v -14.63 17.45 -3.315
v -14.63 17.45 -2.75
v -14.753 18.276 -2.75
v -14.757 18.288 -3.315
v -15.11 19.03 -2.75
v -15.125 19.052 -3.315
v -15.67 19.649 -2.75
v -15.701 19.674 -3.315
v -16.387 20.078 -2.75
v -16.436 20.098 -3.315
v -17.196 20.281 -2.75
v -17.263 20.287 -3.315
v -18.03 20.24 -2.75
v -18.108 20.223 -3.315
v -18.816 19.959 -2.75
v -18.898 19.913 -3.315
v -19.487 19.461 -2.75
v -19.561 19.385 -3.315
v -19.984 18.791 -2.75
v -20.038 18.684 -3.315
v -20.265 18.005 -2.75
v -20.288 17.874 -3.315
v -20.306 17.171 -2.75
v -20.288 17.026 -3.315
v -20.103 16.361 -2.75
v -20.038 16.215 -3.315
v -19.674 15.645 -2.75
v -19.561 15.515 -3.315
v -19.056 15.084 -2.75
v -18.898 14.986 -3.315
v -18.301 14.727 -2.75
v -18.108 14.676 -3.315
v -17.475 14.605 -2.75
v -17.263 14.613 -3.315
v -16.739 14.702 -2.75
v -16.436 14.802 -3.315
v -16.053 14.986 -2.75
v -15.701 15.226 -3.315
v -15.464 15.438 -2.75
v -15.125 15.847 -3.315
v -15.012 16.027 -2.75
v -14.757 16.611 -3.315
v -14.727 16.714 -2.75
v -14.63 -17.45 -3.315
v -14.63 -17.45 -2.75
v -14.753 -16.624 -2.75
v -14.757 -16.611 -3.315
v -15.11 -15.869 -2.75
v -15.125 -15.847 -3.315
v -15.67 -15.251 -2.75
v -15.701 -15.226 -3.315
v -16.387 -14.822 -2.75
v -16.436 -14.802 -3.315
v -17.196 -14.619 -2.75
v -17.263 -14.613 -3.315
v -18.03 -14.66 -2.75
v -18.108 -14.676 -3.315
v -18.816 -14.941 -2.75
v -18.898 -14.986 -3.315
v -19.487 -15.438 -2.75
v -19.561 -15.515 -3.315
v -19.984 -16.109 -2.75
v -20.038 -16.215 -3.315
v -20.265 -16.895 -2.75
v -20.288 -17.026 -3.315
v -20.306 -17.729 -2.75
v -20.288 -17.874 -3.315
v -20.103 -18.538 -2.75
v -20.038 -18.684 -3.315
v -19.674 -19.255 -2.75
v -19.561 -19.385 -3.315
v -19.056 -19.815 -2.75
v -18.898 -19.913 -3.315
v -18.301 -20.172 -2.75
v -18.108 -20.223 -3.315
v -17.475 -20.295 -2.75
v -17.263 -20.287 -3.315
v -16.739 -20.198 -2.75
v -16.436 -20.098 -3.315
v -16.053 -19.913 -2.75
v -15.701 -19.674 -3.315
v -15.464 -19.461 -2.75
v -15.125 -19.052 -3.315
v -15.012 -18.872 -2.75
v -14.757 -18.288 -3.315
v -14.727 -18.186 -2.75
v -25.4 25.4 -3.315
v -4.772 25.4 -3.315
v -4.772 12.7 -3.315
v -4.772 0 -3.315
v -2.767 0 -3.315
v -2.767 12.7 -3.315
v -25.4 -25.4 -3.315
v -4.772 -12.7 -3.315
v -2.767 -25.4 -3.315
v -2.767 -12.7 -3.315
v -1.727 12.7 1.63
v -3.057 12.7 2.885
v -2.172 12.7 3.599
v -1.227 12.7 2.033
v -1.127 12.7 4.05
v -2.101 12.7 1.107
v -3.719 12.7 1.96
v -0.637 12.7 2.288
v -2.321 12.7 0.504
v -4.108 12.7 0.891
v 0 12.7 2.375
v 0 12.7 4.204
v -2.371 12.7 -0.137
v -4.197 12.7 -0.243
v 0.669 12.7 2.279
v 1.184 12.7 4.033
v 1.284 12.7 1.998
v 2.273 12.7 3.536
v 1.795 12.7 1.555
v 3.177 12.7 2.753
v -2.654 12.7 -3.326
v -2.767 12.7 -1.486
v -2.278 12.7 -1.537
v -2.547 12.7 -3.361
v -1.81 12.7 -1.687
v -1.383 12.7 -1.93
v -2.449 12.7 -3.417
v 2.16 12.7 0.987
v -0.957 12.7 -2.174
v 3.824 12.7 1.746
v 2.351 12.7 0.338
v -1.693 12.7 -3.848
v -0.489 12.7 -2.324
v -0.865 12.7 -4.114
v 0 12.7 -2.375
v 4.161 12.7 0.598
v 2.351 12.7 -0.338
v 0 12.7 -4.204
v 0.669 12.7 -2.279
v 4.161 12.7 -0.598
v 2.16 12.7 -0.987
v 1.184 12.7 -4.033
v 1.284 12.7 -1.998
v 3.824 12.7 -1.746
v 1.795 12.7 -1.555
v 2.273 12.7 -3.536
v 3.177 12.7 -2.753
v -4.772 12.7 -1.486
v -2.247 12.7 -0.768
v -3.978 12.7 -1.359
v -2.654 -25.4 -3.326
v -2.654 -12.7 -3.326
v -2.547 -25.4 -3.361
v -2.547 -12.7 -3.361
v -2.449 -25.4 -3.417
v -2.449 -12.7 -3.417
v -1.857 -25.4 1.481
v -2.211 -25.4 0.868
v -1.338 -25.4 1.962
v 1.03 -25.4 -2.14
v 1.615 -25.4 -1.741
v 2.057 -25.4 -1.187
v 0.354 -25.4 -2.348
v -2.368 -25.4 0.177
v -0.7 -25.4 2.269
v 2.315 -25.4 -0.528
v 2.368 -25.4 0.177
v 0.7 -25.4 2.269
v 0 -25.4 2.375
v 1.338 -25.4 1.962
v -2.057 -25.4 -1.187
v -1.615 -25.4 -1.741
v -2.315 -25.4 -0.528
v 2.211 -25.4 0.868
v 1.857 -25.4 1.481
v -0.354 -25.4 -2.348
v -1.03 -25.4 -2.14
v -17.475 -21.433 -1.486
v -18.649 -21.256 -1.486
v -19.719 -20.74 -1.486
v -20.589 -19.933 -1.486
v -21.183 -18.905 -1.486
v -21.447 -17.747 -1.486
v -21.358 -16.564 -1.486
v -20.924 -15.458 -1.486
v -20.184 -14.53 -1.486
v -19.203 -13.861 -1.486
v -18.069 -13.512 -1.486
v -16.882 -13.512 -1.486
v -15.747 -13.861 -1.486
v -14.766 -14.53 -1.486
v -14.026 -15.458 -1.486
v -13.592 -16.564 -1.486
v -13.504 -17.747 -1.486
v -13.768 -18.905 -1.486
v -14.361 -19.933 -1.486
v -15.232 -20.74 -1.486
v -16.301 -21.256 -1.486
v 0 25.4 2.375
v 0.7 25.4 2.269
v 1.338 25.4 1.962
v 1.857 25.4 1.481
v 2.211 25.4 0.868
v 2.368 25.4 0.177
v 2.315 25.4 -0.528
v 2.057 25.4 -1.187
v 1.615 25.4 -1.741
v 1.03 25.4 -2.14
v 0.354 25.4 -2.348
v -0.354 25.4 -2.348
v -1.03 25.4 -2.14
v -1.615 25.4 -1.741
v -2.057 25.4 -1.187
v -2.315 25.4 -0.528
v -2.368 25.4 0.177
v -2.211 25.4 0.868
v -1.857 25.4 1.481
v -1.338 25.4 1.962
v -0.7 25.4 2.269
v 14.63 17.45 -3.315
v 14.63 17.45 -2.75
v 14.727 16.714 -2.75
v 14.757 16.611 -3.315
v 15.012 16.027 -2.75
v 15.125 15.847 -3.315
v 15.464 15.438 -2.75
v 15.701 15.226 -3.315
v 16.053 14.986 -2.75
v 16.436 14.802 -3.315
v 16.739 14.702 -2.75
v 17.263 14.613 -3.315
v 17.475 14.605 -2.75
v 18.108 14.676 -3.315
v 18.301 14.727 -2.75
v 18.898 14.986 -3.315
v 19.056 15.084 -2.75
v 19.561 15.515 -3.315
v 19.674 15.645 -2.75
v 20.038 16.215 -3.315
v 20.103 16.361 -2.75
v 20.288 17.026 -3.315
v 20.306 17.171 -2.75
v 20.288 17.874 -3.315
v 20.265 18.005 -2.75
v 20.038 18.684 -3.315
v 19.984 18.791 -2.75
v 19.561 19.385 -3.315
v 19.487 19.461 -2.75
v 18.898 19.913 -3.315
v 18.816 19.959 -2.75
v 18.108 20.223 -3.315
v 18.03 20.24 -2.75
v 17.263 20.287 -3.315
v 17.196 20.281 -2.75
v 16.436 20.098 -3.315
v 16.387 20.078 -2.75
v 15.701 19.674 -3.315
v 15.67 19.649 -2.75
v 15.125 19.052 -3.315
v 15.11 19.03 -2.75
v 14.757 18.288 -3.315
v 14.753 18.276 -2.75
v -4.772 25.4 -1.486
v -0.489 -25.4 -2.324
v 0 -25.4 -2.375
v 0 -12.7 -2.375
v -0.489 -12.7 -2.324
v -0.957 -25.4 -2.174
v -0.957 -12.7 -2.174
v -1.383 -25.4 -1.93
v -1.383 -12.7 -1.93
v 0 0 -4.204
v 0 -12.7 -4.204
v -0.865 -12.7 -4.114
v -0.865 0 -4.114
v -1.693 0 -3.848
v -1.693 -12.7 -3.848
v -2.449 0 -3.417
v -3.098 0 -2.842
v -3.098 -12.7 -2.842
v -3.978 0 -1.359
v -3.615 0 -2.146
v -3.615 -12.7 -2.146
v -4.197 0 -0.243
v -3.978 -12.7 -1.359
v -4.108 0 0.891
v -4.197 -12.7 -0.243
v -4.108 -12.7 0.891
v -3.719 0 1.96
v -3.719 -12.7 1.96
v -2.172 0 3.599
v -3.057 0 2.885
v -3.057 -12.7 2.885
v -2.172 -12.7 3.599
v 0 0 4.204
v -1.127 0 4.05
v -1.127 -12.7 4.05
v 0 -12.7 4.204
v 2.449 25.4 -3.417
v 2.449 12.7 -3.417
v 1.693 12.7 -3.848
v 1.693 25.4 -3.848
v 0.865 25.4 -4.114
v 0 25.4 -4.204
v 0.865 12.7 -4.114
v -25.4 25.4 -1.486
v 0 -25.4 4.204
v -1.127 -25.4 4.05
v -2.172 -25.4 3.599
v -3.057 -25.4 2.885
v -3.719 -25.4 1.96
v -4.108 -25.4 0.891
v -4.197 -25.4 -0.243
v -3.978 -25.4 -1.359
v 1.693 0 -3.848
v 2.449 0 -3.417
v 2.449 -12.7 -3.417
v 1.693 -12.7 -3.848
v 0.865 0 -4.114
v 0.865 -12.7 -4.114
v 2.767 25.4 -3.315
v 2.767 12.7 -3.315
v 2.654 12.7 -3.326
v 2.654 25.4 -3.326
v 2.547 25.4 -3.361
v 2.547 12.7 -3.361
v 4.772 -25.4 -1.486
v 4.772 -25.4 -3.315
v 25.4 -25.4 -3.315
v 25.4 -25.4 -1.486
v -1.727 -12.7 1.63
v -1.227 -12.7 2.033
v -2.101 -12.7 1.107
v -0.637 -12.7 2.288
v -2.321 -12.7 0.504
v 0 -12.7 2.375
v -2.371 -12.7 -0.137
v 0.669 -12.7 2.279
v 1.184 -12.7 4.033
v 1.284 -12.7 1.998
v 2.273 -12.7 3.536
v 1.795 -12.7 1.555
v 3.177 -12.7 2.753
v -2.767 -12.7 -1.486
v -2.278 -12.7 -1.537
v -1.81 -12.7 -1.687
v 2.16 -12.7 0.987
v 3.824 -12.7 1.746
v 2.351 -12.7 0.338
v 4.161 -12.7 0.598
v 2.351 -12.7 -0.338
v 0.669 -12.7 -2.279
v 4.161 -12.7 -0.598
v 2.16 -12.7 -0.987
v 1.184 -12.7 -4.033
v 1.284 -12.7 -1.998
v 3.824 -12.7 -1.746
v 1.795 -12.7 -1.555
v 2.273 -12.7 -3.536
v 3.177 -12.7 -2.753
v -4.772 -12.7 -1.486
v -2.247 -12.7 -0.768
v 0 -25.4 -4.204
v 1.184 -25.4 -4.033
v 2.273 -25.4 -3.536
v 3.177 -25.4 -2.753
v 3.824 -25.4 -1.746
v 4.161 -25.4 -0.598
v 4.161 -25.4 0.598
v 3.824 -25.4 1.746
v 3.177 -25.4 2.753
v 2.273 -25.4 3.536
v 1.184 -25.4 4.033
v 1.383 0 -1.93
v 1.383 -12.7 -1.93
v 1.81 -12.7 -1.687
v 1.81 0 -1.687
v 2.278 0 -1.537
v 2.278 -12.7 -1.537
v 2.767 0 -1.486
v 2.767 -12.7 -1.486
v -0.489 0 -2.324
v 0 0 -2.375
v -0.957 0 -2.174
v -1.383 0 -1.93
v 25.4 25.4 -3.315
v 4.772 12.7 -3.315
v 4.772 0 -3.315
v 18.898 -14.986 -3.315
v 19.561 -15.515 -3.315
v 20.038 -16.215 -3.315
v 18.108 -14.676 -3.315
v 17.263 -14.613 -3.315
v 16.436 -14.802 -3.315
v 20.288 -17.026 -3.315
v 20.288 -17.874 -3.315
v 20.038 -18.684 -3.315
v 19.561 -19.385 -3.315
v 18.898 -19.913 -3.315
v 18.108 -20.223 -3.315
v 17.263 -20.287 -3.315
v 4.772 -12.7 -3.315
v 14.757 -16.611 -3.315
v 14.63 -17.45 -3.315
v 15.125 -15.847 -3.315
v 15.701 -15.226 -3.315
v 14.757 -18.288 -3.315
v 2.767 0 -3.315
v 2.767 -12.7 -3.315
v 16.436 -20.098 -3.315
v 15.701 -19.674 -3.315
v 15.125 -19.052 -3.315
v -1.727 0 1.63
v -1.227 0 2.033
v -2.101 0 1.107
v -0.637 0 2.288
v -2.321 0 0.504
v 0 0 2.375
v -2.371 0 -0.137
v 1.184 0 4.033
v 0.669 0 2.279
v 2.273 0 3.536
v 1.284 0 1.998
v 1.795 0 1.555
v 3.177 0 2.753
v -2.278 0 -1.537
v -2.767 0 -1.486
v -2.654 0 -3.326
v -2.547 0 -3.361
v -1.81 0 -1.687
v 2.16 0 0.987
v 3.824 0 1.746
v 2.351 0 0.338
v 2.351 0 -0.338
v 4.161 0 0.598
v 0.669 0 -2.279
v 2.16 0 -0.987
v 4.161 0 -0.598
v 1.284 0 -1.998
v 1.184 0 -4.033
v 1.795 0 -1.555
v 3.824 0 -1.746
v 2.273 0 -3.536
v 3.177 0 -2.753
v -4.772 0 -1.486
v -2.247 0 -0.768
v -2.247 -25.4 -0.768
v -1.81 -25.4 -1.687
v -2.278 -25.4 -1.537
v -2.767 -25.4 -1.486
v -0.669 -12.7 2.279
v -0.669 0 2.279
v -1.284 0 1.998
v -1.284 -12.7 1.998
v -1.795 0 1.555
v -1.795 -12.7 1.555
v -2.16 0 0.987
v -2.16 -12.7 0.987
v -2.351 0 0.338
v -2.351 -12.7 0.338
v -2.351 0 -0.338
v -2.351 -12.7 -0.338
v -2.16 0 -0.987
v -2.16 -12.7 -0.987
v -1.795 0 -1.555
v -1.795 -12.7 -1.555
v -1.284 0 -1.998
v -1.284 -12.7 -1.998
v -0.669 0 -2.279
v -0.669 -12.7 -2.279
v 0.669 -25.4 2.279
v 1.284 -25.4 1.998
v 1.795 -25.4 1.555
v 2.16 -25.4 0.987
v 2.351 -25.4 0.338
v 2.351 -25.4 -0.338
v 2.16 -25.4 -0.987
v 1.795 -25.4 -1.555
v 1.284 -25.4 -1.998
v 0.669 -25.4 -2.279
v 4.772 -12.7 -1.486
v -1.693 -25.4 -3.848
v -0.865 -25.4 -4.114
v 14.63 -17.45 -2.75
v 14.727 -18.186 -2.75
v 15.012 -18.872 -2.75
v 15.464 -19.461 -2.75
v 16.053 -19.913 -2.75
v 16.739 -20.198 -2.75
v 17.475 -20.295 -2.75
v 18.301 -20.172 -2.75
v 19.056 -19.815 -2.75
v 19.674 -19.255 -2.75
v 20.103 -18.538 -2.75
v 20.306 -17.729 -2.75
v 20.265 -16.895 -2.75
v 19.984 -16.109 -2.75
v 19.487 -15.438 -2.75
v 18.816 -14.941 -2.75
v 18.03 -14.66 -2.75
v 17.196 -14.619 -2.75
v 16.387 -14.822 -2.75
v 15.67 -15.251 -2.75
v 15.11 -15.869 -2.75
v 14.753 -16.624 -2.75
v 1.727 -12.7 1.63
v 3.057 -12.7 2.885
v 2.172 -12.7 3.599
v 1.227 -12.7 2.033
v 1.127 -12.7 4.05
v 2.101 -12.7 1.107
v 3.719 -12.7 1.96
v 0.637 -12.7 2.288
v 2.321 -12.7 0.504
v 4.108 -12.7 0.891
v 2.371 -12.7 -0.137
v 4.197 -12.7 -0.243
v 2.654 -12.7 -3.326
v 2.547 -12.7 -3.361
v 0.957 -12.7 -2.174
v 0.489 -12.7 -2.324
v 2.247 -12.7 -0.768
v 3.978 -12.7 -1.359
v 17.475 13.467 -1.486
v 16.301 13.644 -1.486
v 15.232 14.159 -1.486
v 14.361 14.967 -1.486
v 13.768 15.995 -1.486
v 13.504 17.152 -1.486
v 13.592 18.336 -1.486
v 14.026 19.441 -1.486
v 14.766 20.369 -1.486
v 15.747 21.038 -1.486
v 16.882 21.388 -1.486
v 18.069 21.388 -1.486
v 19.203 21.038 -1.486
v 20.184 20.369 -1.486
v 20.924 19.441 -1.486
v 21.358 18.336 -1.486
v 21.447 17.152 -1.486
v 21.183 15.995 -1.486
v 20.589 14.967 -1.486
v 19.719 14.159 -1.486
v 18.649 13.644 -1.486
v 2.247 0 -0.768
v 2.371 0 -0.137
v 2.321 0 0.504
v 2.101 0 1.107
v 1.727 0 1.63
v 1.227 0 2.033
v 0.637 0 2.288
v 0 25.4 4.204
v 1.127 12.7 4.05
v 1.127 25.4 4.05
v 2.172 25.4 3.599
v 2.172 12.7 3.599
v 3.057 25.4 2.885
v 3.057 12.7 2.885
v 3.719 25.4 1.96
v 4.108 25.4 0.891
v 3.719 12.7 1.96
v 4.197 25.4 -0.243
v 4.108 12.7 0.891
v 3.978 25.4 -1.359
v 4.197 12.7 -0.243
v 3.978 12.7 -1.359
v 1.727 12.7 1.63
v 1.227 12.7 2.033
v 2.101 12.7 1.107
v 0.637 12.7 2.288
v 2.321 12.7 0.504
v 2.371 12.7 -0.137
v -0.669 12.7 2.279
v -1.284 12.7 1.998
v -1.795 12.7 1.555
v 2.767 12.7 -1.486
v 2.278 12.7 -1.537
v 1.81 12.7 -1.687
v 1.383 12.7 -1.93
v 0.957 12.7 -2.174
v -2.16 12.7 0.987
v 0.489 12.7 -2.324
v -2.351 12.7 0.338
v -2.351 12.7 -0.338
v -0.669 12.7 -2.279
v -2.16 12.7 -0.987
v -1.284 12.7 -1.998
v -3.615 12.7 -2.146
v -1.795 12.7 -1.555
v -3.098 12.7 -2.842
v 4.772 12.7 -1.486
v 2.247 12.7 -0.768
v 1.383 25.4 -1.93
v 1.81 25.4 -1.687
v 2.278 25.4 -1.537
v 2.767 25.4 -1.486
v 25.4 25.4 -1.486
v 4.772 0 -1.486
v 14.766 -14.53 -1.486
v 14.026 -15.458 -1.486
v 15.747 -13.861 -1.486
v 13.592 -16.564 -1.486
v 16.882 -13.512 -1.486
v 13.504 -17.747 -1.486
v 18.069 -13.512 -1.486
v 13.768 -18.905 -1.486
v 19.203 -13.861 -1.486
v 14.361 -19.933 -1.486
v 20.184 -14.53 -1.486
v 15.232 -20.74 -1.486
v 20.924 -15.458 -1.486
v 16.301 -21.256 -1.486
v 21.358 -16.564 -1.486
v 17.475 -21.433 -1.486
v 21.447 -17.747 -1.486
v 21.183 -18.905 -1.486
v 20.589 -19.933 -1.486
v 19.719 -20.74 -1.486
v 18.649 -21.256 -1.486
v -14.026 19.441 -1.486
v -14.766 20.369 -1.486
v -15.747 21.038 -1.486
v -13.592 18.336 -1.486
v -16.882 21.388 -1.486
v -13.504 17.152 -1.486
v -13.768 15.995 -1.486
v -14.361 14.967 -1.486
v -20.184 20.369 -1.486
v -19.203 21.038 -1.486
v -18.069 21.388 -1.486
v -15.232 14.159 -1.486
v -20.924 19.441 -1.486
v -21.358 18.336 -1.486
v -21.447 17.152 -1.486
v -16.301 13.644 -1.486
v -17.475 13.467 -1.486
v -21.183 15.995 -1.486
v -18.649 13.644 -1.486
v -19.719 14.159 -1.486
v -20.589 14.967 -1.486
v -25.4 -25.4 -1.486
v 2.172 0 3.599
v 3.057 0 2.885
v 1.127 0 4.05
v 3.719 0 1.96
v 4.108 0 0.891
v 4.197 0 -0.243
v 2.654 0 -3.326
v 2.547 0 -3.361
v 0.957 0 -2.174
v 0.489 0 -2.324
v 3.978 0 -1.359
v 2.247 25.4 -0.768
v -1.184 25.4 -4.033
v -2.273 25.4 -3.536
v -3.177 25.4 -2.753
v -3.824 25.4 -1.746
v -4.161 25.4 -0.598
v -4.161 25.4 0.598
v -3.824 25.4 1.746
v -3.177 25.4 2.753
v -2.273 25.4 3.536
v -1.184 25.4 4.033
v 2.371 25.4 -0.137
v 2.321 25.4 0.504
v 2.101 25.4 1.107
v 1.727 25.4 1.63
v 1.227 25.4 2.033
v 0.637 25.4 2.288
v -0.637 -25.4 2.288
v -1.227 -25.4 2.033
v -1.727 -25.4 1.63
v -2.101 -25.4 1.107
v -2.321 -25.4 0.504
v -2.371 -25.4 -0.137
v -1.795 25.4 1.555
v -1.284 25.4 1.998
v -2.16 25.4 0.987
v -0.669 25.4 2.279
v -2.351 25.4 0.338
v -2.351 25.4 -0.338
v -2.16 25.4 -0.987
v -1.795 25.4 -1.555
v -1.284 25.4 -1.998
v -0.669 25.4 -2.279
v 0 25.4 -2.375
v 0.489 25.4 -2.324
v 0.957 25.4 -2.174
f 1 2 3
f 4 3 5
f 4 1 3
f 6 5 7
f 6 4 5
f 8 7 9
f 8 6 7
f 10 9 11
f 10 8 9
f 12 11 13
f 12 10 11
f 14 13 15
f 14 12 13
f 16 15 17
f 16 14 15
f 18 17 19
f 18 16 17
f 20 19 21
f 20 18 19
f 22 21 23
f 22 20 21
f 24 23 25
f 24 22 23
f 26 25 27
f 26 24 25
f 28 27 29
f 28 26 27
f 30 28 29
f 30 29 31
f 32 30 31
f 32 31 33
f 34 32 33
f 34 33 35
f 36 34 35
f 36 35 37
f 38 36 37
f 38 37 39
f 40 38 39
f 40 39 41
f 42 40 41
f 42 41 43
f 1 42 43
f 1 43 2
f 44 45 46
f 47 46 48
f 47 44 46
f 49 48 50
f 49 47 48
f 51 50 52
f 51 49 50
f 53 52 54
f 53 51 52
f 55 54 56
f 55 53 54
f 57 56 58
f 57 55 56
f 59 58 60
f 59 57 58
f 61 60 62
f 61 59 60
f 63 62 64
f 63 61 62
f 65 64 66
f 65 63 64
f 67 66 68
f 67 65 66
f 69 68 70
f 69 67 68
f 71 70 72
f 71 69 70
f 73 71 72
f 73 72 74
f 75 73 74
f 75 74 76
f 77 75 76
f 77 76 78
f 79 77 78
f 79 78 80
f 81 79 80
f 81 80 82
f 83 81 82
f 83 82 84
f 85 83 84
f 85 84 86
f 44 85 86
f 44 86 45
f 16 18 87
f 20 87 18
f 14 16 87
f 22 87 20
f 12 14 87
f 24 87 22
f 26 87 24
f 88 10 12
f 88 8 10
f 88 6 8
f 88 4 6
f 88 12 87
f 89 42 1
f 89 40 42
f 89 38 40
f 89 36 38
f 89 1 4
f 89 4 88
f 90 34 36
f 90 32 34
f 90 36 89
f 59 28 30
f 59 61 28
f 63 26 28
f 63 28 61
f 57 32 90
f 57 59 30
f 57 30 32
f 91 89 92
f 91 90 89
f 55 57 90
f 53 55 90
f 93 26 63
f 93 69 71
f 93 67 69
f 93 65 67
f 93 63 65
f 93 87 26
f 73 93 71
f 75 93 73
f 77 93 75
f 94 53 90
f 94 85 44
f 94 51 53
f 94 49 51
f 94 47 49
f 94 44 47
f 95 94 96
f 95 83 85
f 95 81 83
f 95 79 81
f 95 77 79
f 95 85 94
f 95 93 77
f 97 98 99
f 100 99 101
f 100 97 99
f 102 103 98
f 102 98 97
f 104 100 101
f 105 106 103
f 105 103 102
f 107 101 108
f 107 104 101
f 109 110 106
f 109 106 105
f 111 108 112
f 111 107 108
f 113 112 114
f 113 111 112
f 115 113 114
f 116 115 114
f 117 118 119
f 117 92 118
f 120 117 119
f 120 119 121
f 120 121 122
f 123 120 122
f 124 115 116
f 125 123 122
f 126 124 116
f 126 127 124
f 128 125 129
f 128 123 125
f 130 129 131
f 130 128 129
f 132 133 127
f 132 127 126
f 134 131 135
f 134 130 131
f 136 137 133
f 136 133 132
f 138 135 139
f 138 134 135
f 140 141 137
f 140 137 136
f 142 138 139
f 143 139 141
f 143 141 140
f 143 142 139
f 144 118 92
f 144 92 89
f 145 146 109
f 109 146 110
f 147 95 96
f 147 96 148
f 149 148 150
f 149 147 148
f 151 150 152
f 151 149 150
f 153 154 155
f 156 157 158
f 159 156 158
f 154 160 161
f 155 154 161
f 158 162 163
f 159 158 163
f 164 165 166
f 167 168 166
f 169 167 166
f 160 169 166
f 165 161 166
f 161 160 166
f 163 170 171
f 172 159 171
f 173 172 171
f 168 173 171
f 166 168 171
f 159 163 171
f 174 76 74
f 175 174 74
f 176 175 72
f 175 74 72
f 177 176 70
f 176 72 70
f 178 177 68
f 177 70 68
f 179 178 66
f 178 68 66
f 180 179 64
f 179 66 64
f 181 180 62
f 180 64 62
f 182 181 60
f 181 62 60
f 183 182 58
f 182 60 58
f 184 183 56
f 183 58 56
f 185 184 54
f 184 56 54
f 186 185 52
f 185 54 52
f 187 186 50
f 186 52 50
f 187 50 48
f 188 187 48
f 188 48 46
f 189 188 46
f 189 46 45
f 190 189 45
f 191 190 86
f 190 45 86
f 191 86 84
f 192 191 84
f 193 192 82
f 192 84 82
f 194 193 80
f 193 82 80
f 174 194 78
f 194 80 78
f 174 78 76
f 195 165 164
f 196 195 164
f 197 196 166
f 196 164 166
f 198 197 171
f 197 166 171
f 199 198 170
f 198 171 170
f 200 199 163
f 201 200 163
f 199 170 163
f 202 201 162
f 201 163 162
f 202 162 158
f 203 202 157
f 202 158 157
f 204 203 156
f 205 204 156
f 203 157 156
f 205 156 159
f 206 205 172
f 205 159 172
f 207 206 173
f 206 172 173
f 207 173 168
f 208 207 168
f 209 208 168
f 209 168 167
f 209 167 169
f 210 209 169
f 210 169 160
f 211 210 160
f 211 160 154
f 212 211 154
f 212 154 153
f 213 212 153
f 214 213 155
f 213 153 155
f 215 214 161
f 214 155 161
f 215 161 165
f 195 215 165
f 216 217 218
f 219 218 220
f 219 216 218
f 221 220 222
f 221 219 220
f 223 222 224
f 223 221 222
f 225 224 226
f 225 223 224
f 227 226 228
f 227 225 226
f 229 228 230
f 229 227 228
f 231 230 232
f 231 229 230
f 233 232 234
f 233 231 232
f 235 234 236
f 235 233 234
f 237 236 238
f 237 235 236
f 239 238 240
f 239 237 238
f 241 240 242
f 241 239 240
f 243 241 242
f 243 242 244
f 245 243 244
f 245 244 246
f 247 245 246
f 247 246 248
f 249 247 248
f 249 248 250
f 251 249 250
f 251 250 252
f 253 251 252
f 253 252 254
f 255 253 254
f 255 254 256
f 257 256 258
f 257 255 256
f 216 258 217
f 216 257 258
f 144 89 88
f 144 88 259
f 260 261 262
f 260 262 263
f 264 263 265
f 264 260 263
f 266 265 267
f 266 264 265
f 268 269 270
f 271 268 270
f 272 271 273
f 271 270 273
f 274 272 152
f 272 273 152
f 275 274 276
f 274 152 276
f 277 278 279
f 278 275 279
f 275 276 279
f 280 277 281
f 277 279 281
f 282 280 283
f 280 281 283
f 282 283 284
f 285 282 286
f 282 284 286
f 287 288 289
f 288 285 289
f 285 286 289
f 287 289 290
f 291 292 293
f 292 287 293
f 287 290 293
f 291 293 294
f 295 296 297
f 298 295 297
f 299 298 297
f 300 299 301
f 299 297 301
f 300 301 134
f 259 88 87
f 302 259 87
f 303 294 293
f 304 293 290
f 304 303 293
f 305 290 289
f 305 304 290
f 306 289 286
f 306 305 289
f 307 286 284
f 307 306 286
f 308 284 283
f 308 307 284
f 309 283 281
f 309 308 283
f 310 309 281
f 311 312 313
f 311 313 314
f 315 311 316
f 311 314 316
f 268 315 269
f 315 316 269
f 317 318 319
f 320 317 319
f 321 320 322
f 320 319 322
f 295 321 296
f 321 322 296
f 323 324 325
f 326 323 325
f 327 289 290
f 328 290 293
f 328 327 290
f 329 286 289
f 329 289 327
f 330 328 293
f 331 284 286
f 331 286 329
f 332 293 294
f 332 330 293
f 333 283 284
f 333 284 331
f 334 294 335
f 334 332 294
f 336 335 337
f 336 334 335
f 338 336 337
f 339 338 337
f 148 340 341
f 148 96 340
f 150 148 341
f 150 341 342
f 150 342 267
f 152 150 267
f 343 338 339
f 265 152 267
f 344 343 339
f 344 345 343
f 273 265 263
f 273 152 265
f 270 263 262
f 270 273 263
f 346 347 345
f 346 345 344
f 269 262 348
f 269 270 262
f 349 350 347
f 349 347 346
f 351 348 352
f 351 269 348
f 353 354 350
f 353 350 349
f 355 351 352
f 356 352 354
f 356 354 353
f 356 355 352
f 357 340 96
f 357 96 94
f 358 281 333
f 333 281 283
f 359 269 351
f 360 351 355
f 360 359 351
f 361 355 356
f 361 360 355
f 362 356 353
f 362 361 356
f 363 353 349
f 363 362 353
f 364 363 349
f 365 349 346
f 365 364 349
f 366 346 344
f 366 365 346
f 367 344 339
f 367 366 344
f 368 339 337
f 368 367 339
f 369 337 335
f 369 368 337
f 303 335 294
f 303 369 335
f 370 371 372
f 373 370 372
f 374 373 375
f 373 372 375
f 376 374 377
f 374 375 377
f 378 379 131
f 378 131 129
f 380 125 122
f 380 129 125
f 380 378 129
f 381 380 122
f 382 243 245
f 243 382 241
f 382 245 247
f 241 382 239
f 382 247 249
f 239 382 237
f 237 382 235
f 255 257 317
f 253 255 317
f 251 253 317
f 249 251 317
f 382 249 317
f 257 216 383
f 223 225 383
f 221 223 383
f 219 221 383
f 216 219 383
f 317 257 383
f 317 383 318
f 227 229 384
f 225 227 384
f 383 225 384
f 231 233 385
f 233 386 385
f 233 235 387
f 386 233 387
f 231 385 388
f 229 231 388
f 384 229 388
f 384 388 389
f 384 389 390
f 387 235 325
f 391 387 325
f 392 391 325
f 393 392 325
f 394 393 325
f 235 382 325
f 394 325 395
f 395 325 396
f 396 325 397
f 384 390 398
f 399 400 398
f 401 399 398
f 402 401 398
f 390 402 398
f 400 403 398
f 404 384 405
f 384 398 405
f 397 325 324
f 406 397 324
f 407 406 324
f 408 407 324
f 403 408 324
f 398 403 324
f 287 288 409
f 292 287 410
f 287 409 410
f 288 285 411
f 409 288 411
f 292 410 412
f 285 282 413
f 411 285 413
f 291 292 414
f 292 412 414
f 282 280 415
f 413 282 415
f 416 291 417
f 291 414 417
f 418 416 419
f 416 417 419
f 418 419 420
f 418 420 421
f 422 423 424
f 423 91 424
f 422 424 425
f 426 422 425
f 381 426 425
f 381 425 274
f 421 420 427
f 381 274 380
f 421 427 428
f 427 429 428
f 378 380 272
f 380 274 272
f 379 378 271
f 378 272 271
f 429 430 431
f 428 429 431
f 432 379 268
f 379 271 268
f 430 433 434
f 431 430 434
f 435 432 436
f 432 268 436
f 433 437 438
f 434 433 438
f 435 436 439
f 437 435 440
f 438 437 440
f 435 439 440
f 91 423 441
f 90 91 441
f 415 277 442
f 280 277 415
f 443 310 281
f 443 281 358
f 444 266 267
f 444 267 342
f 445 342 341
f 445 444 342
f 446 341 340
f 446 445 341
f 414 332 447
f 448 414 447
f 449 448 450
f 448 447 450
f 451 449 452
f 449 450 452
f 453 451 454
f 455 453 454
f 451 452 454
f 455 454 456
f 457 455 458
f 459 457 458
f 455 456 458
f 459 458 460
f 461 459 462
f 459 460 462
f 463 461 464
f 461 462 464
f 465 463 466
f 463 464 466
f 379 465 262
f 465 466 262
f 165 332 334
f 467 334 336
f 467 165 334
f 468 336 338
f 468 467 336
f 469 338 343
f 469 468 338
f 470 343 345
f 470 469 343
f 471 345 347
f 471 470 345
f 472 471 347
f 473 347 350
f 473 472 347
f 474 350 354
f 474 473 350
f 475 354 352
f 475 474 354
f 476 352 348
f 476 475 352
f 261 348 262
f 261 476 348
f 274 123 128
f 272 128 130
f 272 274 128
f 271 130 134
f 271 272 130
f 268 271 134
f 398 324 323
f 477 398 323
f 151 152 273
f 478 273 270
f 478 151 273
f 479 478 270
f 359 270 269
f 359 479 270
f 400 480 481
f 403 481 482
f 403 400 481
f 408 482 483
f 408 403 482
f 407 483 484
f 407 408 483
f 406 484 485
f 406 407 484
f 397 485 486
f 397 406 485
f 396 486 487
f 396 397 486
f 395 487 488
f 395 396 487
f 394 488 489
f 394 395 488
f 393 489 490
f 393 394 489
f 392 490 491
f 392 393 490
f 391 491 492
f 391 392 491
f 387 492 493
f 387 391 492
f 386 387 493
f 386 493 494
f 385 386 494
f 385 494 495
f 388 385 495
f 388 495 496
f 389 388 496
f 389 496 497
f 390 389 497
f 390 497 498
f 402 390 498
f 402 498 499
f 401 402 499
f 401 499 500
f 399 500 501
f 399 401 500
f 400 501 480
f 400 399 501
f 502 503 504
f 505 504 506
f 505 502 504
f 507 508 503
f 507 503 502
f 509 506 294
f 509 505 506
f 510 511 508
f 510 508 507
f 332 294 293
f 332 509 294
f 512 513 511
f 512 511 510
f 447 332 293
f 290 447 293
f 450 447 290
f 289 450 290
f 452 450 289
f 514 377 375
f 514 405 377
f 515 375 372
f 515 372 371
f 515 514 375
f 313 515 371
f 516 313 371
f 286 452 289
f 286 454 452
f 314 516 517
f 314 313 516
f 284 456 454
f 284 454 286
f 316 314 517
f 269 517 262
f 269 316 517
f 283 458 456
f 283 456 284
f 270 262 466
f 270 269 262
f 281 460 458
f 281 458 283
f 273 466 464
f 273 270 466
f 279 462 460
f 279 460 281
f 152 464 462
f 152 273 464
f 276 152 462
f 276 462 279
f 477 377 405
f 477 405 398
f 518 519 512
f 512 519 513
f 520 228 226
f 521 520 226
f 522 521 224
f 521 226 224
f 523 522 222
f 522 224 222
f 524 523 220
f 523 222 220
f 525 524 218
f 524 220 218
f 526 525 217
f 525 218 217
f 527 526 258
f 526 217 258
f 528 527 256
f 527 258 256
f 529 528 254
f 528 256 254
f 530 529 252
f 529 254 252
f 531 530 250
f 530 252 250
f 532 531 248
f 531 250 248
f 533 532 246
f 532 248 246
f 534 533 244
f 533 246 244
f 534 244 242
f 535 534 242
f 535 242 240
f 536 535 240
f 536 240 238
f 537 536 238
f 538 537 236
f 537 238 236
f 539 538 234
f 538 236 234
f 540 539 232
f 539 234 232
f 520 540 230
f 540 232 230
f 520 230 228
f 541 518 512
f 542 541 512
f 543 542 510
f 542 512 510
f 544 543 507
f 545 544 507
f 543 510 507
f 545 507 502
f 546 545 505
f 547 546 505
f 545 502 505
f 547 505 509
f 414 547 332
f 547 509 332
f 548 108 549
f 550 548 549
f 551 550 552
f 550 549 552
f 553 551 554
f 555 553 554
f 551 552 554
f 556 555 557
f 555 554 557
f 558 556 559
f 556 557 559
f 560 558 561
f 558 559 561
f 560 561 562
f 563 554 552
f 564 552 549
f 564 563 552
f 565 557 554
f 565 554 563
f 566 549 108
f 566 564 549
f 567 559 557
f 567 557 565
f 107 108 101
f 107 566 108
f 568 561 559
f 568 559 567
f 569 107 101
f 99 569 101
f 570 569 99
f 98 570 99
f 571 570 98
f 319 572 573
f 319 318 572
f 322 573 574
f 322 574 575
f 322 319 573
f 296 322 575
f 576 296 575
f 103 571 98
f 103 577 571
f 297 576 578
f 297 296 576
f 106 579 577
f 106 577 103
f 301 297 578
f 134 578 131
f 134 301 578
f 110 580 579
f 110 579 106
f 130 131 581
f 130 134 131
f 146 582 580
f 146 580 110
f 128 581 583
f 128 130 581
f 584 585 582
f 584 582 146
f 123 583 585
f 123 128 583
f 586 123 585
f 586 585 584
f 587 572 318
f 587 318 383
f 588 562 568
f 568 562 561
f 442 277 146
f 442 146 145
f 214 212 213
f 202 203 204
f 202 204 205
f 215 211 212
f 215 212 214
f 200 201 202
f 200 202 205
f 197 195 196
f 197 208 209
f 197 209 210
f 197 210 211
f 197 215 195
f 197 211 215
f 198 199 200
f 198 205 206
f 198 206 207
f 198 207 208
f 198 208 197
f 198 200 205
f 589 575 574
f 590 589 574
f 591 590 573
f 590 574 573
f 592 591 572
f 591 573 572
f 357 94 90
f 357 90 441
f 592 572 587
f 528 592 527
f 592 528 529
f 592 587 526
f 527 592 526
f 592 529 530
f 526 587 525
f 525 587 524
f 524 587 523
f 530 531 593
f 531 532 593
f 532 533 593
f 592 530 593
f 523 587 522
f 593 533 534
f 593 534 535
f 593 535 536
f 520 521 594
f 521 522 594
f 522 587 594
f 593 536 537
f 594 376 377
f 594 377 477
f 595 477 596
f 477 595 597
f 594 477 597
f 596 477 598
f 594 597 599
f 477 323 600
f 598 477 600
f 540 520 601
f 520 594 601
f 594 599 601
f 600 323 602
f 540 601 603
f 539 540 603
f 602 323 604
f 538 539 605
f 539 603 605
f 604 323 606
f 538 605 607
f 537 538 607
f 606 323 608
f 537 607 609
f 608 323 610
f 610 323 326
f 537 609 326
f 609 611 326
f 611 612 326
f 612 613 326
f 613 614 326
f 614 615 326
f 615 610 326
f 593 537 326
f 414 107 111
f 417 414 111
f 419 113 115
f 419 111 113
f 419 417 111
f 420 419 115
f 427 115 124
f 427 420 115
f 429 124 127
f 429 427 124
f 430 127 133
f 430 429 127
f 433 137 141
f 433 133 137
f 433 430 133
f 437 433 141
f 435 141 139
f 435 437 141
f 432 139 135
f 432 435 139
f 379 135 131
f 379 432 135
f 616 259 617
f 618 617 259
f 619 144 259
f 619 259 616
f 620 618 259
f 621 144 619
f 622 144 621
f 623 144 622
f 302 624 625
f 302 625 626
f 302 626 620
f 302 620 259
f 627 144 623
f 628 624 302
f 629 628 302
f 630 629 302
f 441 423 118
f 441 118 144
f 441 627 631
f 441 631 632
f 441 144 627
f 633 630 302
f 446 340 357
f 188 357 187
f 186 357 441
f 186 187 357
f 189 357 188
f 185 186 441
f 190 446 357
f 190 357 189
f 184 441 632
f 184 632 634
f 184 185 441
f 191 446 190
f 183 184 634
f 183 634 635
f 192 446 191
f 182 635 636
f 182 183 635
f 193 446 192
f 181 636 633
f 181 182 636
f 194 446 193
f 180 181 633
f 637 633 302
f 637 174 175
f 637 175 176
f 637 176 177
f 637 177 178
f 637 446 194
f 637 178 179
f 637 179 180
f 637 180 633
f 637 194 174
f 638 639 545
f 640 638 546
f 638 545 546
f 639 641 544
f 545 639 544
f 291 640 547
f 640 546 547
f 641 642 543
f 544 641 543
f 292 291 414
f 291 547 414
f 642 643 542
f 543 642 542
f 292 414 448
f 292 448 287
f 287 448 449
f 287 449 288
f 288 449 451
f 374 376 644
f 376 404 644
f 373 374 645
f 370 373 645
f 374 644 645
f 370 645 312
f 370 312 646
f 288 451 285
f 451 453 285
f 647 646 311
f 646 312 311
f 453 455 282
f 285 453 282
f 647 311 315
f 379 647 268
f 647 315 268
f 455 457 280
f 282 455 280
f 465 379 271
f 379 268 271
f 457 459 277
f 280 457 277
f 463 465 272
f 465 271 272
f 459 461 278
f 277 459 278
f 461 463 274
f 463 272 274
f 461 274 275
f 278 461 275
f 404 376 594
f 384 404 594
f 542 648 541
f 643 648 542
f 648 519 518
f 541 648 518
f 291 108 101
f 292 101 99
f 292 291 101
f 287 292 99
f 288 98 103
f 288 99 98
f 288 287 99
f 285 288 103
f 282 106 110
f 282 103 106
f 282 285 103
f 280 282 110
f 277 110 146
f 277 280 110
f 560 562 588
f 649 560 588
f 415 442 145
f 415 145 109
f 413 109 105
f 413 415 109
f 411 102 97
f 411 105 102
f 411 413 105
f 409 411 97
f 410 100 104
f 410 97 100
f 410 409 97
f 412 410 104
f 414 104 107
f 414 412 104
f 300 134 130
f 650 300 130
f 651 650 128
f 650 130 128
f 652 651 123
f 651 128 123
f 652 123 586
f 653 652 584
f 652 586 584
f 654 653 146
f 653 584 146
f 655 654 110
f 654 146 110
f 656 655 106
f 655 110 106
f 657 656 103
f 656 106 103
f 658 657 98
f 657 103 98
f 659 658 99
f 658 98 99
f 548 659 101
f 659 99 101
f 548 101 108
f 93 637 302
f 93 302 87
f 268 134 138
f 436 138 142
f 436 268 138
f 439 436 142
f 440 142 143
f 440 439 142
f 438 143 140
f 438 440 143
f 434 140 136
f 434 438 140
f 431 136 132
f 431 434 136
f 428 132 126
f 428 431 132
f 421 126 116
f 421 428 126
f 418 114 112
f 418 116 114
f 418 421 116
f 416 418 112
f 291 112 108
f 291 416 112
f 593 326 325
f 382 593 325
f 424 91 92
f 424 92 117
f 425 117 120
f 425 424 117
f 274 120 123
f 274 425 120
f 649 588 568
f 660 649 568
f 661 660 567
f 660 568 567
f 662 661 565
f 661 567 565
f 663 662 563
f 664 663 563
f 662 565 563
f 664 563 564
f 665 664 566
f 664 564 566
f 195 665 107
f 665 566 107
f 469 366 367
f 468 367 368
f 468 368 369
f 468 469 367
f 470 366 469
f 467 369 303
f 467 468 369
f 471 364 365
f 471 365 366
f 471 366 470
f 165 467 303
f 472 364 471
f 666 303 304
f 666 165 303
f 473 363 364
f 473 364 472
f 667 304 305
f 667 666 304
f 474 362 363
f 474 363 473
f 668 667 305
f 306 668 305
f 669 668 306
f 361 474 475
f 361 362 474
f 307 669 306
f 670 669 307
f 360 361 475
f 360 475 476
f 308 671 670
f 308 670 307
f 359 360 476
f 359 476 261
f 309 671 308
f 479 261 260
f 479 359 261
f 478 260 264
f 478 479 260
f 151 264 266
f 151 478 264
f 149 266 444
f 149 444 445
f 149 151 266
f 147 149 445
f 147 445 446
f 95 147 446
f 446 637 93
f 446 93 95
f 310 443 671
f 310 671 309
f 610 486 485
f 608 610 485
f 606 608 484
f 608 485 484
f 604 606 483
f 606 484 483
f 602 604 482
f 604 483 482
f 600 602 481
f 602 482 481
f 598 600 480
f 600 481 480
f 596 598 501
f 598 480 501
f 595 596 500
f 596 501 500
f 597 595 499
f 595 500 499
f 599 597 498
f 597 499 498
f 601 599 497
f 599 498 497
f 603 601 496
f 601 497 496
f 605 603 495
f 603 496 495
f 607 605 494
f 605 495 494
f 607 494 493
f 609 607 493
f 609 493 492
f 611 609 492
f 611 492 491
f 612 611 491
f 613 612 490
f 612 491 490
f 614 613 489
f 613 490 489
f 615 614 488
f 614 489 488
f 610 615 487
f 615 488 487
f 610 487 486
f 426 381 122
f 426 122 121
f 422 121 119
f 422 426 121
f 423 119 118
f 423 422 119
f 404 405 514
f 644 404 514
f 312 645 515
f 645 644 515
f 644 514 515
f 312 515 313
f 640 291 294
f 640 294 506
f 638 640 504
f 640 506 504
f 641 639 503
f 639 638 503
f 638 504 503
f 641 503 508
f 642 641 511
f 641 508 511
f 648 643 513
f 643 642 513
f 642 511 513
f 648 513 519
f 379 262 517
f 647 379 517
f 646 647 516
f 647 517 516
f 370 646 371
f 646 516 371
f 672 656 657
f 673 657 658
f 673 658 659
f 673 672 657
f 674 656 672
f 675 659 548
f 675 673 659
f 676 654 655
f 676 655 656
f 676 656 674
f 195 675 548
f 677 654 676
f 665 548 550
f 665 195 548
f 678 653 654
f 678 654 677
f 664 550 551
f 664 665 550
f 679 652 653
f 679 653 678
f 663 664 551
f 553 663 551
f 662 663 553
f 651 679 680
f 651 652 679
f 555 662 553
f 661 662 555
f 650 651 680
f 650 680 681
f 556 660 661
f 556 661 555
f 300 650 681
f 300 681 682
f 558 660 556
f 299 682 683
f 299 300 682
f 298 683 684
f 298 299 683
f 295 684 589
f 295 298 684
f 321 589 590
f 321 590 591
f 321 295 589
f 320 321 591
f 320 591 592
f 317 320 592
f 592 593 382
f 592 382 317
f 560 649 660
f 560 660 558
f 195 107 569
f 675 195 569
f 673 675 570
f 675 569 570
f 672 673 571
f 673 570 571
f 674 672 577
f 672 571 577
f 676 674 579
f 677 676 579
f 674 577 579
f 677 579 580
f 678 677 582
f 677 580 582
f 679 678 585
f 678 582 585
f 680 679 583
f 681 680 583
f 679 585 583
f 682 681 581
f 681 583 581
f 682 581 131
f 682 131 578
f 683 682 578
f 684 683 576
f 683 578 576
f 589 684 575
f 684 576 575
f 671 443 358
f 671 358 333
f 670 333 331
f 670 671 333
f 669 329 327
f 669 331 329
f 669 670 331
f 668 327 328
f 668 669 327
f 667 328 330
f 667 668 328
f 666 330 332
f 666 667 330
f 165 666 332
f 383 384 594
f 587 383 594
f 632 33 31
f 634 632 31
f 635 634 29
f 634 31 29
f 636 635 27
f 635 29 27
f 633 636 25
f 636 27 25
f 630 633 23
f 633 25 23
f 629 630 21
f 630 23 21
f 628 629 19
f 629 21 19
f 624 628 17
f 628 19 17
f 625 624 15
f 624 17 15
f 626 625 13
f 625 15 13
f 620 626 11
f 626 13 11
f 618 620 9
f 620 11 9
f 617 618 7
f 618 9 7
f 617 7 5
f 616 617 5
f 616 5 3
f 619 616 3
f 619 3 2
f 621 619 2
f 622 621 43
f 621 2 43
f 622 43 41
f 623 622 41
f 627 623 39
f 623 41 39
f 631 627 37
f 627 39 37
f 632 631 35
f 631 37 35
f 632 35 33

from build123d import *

# Parameters (mm, degrees)
EXTRUDE_THIN1_DEPTH      = 25.4
EXTRUDE_THIN1_DEPTH_BACK = 25.4
EXTRUDE_THIN2_DEPTH      = 25.4
EXTRUDE_THIN2_DEPTH_BACK = 25.4
CUT_EXTRUDE1_START       = -12.7
CUT_EXTRUDE1_DEPTH       = 12.7
LPATTERN1_COUNT          = 2
LPATTERN1_PITCH          = 25.4
CUT_EXTRUDE2_START       = -25.4
CUT_EXTRUDE2_DEPTH       = 12.7
LPATTERN2_COUNT          = 2
LPATTERN2_PITCH          = 25.4
CUT_EXTRUDE3_DEPTH       = 37.16615951
CUT_EXTRUDE3_DEPTH_BACK  = 37.16615951
SKETCH6_R                = 2.8448
BOSS_EXTRUDE1_DEPTH      = 25.4
BOSS_EXTRUDE1_DEPTH_BACK = 25.4
SKETCH7_R                = 2.3749


# Read off the part's stored shape, not the designer's step: Cut-Extrude1
with BuildPart() as part:
    # Sketch3 → Extrude-Thin1 (new, two sides: drawn at the far end of the back side and taken through both)
    with BuildSketch(Plane(origin=(0, 0, 0), x_dir=(1, 0, 0), z_dir=(0, 1, 0)).offset(-EXTRUDE_THIN1_DEPTH_BACK)):
        with BuildLine():
            ThreePointArc((-2.247389762, 0.767716918), (-1.931760974, -1.381466449), (0, -2.3749))
            ThreePointArc((0, -2.3749), (2.3749, 0), (0, 2.3749))
            ThreePointArc((0, 2.3749), (-0.726513266, 2.261045883), (-1.383367576, 1.9304))
            ThreePointArc((-1.383367576, 1.9304), (-2.040221886, 1.599754117), (-2.766735152, 1.4859))
            Line((-2.766735152, 1.4859), (-25.4, 1.4859))
            Line((-25.4, 1.4859), (-25.4, 3.3147))
            Line((-25.4, 3.3147), (-2.766735152, 3.3147))
            ThreePointArc((-2.766735152, 3.3147), (-2.599675952, 3.340880358), (-2.448634586, 3.41691123))
            ThreePointArc((-2.448634586, 3.41691123), (-1.285967331, 4.002172124), (0, 4.2037))
            ThreePointArc((0, 4.2037), (4.2037, 0), (0, -4.2037))
            ThreePointArc((0, -4.2037), (-3.419320226, -2.44526949), (-3.97800006, 1.3589))
            Line((-3.97800006, 1.3589), (-2.247389762, 0.767716918))
        make_face()
    extrude(amount=EXTRUDE_THIN1_DEPTH + EXTRUDE_THIN1_DEPTH_BACK)

    # Cut-Extrude1 outline → Cut-Extrude1 (cut)
    with BuildSketch(Plane(origin=(0, 25.4, 0), x_dir=(1, 0, 0), z_dir=(0, 1, 0)).offset(CUT_EXTRUDE1_START)):
        with BuildLine():
            Line((-2.766735152, 3.3147), (-4.77175006, 3.3147))
            Line((-4.77175006, 3.3147), (-4.77175006, 1.4859))
            Line((-4.77175006, 1.4859), (-2.766735152, 1.4859))
            ThreePointArc((-2.766735152, 1.4859), (-2.040221886, 1.599754117), (-1.383367576, 1.9304))
            ThreePointArc((-1.383367576, 1.9304), (1.906189315, -1.416542378), (-2.247389762, 0.767716918))
            Line((-2.247389762, 0.767716918), (-3.97800006, 1.3589))
            ThreePointArc((-3.97800006, 1.3589), (3.37405702, -2.507355761), (-2.448634586, 3.41691123))
            ThreePointArc((-2.448634586, 3.41691123), (-2.599675952, 3.340880358), (-2.766735152, 3.3147))
        make_face()
    cut_extrude1 = extrude(amount=CUT_EXTRUDE1_DEPTH, mode=Mode.SUBTRACT)

    # LPattern1: Cut-Extrude1 ×2
    with Locations(*[(0, -i * LPATTERN1_PITCH, 0) for i in range(1, LPATTERN1_COUNT)]):
        add(cut_extrude1, mode=Mode.SUBTRACT)


with BuildPart() as body_2:
    # Sketch4 → Extrude-Thin2 (new, two sides: drawn at the far end of the back side and taken through both)
    with BuildSketch(Plane(origin=(0, 0, 0), x_dir=(1, 0, 0), z_dir=(0, 1, 0)).offset(-EXTRUDE_THIN2_DEPTH_BACK)):
        with BuildLine():
            ThreePointArc((2.247389762, 0.767716918), (1.931760974, -1.381466449), (0, -2.3749))
            ThreePointArc((0, -2.3749), (-2.3749, 0), (0, 2.3749))
            ThreePointArc((0, 2.3749), (0.726513266, 2.261045883), (1.383367576, 1.9304))
            ThreePointArc((1.383367576, 1.9304), (2.040221886, 1.599754117), (2.766735152, 1.4859))
            Line((2.766735152, 1.4859), (25.4, 1.4859))
            Line((25.4, 1.4859), (25.4, 3.3147))
            Line((25.4, 3.3147), (2.766735152, 3.3147))
            ThreePointArc((2.766735152, 3.3147), (2.599675952, 3.340880358), (2.448634586, 3.41691123))
            ThreePointArc((2.448634586, 3.41691123), (1.285967331, 4.002172124), (0, 4.2037))
            ThreePointArc((0, 4.2037), (-4.2037, 0), (0, -4.2037))
            ThreePointArc((0, -4.2037), (3.419320226, -2.44526949), (3.97800006, 1.3589))
            Line((3.97800006, 1.3589), (2.247389762, 0.767716918))
        make_face()
    extrude(amount=EXTRUDE_THIN2_DEPTH + EXTRUDE_THIN2_DEPTH_BACK)

    # Sketch5<2> → Cut-Extrude2 (cut)
    with BuildSketch(Plane(origin=(0, 25.4, 0), x_dir=(1, 0, 0), z_dir=(0, 1, 0)).offset(CUT_EXTRUDE2_START)):
        with BuildLine():
            Line((-3.97800006, 3.3147), (-2.766735152, 3.3147))
            ThreePointArc((-2.766735152, 3.3147), (-2.599675952, 3.340880358), (-2.448634586, 3.41691123))
            ThreePointArc((-2.448634586, 3.41691123), (0, 4.2037), (2.448634586, 3.41691123))
            ThreePointArc((2.448634586, 3.41691123), (2.599675952, 3.340880358), (2.766735152, 3.3147))
            Line((2.766735152, 3.3147), (3.97800006, 3.3147))
            Line((3.97800006, 3.3147), (4.77175006, 3.3147))
            Line((4.77175006, 3.3147), (4.77175006, 1.4859))
            Line((4.77175006, 1.4859), (3.97800006, 1.4859))
            Line((3.97800006, 1.4859), (3.97800006, 1.3589))
            ThreePointArc((3.97800006, 1.3589), (0, -4.2037), (-3.97800006, 1.3589))
            Line((-3.97800006, 1.3589), (-3.97800006, 1.4859))
            Line((-3.97800006, 1.4859), (-4.77175006, 1.4859))
            Line((-4.77175006, 1.4859), (-4.77175006, 3.3147))
            Line((-4.77175006, 3.3147), (-3.97800006, 3.3147))
        make_face()
    cut_extrude2 = extrude(amount=CUT_EXTRUDE2_DEPTH, mode=Mode.SUBTRACT)

    # LPattern2: Cut-Extrude2 ×2
    with Locations(*[(0, -i * LPATTERN2_PITCH, 0) for i in range(1, LPATTERN2_COUNT)]):
        add(cut_extrude2, mode=Mode.SUBTRACT)


with BuildPart() as cut_extrude3_tool:
    # Sketch6 → Cut-Extrude3 (new, two sides: drawn at the far end of the back side and taken through both)
    with BuildSketch(Plane.XY.offset(-CUT_EXTRUDE3_DEPTH_BACK)):
        with Locations((-17.4752, 17.4498)):
            Circle(SKETCH6_R)
        with Locations((-17.4752, -17.4498)):
            Circle(SKETCH6_R)
        with Locations(Location((17.4752, -17.4498, 0), (0, 0, 180))):
            Circle(SKETCH6_R)
        with Locations(Location((17.4752, 17.4498, 0), (0, 0, 180))):
            Circle(SKETCH6_R)
    extrude(amount=CUT_EXTRUDE3_DEPTH + CUT_EXTRUDE3_DEPTH_BACK)


with BuildPart() as part_1:
    add(part.part)

    # Cut-Extrude3: cut by cut_extrude3_tool
    add(cut_extrude3_tool.part, mode=Mode.SUBTRACT)

    # Cut-Extrude4 cone 3 section (through the dimple's axis) → Cut-Extrude4 cone 3 (revolve, cut)
    with BuildSketch(Plane(origin=(-17.4752, -17.4498, -1.4859), x_dir=(0, -1, 0), z_dir=(1, 0, 0))):
        Polygon((0, 0), (3.98272, 0), (0, 4.423258675), align=None)
    revolve(axis=Axis((-17.4752, -17.4498, -1.4859), (0, 0, -1)), mode=Mode.SUBTRACT)

    # Cut-Extrude4 cone 4 section (through the dimple's axis) → Cut-Extrude4 cone 4 (revolve, cut)
    with BuildSketch(Plane(origin=(-17.4752, 17.4498, -1.4859), x_dir=(0, -1, 0), z_dir=(1, 0, 0))):
        Polygon((0, 0), (3.98272, 0), (0, 4.423258675), align=None)
    revolve(axis=Axis((-17.4752, 17.4498, -1.4859), (0, 0, -1)), mode=Mode.SUBTRACT)


with BuildPart() as body_2_1:
    add(body_2.part)

    # Cut-Extrude3: cut by cut_extrude3_tool
    add(cut_extrude3_tool.part, mode=Mode.SUBTRACT)

    # Cut-Extrude4 cone 1 section (through the dimple's axis) → Cut-Extrude4 (revolve, cut)
    with BuildSketch(Plane(origin=(17.4752, 17.4498, -1.4859), x_dir=(0, -1, 0), z_dir=(1, 0, 0))):
        Polygon((0, 0), (3.98272, 0), (0, 4.423258675), align=None)
    revolve(axis=Axis((17.4752, 17.4498, -1.4859), (0, 0, -1)), mode=Mode.SUBTRACT)

    # Cut-Extrude4 cone 2 section (through the dimple's axis) → Cut-Extrude4 cone 2 (revolve, cut)
    with BuildSketch(Plane(origin=(17.4752, -17.4498, -1.4859), x_dir=(0, -1, 0), z_dir=(1, 0, 0))):
        Polygon((0, 0), (3.98272, 0), (0, 4.423258675), align=None)
    revolve(axis=Axis((17.4752, -17.4498, -1.4859), (0, 0, -1)), mode=Mode.SUBTRACT)


with BuildPart() as body_3:
    # Sketch7 → Boss-Extrude1 (new, two sides: drawn at the far end of the back side and taken through both)
    with BuildSketch(Plane(origin=(0, 0, 0), x_dir=(1, 0, 0), z_dir=(0, 1, 0)).offset(-BOSS_EXTRUDE1_DEPTH_BACK)):
        with Locations(Location((0, 0, 0), (0, 0, 270))):
            Circle(SKETCH7_R)
    extrude(amount=BOSS_EXTRUDE1_DEPTH + BOSS_EXTRUDE1_DEPTH_BACK)


solid = Compound([part_1.part, body_2_1.part, body_3.part])
